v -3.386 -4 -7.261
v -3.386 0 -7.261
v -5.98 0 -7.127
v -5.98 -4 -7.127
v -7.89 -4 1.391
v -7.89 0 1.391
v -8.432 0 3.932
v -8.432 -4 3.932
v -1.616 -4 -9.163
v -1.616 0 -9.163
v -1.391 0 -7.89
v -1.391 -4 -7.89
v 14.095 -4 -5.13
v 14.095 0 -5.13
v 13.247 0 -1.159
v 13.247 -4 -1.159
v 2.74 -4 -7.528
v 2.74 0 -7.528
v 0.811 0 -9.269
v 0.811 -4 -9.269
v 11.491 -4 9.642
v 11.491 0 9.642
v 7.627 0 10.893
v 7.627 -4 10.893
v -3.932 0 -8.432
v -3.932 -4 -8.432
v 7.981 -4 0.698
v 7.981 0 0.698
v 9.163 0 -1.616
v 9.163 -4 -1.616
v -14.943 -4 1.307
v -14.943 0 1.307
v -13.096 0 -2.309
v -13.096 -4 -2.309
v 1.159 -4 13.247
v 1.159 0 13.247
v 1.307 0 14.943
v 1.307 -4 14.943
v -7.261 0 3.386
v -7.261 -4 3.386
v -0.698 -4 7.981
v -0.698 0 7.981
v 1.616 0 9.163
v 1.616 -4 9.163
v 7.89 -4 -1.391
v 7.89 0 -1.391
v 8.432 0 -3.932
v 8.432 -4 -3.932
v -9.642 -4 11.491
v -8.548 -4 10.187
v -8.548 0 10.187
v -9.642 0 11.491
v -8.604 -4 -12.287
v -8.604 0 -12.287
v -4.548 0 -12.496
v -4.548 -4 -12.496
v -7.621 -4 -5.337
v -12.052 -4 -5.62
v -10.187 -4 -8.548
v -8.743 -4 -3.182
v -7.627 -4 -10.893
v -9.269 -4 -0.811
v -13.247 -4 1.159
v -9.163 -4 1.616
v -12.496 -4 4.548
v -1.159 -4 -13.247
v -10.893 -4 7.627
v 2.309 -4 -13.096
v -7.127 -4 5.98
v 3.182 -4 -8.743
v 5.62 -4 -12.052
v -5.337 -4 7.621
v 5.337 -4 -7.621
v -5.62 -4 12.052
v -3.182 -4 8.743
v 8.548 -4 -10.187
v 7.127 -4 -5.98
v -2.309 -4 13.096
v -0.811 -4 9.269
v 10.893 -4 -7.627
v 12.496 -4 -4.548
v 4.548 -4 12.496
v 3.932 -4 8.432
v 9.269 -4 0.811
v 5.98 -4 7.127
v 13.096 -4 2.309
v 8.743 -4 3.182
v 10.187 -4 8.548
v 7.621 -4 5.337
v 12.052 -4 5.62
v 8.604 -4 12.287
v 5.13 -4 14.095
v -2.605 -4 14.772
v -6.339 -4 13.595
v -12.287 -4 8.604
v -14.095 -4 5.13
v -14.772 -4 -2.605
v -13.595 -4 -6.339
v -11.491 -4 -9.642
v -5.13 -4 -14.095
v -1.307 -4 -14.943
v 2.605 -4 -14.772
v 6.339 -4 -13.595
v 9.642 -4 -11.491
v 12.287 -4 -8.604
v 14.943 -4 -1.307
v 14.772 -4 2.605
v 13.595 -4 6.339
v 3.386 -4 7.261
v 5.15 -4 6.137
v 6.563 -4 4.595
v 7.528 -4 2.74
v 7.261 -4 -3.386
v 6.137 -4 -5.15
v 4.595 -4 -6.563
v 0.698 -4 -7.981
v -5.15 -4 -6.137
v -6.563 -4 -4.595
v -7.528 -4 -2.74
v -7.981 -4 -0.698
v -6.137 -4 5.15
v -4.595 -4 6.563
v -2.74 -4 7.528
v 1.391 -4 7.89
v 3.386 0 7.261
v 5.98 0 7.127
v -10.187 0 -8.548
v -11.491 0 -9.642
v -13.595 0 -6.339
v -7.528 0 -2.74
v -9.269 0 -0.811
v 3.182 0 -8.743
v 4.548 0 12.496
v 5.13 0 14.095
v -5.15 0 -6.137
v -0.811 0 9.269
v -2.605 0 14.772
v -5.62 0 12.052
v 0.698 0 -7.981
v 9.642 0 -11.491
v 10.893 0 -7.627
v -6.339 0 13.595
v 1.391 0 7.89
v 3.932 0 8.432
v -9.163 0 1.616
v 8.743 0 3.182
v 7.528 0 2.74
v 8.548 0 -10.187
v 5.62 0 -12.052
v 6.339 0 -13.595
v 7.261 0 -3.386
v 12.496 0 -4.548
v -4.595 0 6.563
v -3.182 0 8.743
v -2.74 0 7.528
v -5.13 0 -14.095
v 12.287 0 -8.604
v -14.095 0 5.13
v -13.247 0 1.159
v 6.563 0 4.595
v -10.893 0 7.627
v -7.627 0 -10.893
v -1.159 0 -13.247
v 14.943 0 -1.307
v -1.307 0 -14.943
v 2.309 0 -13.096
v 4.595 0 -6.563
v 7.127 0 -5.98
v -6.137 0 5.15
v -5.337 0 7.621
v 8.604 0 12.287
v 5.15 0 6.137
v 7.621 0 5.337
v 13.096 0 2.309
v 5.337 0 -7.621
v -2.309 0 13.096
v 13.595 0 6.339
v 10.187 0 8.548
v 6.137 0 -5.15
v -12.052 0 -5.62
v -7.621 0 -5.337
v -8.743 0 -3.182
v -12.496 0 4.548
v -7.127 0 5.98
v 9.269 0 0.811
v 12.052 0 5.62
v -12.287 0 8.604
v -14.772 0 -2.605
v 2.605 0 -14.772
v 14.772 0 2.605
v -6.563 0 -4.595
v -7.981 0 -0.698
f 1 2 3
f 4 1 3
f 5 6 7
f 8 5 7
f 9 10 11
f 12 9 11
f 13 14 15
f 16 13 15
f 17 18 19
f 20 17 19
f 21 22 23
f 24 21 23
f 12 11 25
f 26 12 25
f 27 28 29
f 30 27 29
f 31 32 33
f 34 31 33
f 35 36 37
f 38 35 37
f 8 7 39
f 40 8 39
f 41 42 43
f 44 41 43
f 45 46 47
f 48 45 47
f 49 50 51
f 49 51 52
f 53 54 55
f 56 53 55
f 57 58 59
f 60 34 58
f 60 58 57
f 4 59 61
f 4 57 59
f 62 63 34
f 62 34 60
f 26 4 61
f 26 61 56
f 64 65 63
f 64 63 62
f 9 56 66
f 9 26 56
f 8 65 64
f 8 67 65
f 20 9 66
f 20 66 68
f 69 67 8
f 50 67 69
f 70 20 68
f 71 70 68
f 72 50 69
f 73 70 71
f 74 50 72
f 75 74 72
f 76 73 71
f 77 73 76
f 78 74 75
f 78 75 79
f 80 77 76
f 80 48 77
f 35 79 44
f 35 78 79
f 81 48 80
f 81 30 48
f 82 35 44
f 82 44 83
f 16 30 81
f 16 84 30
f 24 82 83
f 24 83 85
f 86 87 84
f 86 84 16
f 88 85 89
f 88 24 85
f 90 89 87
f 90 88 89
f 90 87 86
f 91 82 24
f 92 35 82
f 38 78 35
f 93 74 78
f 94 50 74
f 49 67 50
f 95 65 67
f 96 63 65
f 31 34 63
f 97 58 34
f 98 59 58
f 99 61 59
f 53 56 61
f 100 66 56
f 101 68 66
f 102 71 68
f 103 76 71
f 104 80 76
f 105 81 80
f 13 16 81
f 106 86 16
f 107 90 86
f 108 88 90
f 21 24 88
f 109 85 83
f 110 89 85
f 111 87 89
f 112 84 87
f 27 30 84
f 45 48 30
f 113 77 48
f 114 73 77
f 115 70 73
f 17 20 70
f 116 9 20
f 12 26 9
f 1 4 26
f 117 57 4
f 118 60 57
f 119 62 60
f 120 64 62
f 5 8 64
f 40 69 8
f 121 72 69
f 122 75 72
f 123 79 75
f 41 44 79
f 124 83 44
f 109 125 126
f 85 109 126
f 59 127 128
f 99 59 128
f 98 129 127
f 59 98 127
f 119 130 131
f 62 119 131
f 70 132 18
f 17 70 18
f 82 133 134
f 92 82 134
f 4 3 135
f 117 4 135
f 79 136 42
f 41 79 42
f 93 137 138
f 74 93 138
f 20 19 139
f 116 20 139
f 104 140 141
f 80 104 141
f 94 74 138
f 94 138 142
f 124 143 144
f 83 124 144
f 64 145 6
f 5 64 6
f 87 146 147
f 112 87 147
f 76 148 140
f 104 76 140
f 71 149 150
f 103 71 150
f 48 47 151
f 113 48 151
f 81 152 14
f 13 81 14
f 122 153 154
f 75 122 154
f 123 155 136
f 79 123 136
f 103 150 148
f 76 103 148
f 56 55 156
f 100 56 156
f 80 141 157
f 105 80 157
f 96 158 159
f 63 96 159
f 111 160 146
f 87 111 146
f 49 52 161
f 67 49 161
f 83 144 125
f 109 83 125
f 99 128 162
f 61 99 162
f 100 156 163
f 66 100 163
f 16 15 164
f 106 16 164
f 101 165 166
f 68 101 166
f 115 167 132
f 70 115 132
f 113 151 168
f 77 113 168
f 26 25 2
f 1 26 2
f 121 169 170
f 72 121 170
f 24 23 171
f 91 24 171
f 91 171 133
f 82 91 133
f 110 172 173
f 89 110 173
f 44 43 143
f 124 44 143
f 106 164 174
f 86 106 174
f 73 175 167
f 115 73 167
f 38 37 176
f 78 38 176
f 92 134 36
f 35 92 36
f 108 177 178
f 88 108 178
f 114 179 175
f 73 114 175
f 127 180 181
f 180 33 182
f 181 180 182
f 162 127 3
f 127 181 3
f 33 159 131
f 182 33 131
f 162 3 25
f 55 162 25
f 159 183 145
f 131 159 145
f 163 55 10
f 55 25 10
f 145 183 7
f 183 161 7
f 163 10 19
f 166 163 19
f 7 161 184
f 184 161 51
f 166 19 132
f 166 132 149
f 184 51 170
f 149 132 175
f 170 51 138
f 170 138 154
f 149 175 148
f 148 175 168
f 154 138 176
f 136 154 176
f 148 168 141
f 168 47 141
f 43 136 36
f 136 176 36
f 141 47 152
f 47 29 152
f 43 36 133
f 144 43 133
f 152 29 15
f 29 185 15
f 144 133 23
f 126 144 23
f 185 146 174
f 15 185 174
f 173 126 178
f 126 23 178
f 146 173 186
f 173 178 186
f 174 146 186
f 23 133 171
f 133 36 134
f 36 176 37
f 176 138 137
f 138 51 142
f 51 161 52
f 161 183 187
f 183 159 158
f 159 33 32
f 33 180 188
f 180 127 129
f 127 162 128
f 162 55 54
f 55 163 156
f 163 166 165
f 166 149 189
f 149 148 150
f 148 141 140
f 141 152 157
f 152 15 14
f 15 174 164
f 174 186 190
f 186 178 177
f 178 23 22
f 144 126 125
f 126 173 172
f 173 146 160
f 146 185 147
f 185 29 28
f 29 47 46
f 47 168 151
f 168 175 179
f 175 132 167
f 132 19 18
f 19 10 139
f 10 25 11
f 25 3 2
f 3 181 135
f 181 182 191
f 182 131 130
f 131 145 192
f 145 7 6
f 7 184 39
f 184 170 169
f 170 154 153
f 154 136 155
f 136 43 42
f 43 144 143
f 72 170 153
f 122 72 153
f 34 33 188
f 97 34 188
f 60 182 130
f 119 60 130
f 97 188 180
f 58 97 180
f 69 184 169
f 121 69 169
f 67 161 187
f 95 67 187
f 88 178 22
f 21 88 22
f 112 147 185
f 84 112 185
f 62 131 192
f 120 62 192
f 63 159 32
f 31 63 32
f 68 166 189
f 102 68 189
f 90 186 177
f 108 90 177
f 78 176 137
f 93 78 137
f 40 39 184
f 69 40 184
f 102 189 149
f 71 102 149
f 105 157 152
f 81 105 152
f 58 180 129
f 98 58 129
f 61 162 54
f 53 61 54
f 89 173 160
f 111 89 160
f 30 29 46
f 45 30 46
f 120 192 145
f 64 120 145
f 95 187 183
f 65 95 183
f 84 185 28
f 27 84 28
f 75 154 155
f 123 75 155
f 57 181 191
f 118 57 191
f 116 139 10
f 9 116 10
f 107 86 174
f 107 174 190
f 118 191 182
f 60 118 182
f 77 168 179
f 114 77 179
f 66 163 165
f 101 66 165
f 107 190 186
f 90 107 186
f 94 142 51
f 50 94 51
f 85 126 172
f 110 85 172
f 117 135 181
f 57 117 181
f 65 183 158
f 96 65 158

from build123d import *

# Parameters (mm, degrees)
F1_DEPTH = 4
F2_COUNT = 24


with BuildPart() as f1:
    # F0 (on Front) → F1 (new body)
    with BuildSketch(Plane.XZ):
        Polygon((5.1303021499, 14.0953893118), (0, 13), (1.7364817767, 9.8480775301), (1.3911704768, 7.889719833), (5, 8.6602540378), (4.4462618632, 12.2160040702), align=None)
    extrude(amount=F1_DEPTH)

    # F2: F1 ×24 about axis
    f2_axis = Axis((0, 0, 0), (0, -1, 0))


with BuildPart() as f1_1:
    add(f1.part)
    for i in range(1, F2_COUNT):
        add(f1.part.rotate(f2_axis, i * 360 / F2_COUNT))


solid = f1_1.part
